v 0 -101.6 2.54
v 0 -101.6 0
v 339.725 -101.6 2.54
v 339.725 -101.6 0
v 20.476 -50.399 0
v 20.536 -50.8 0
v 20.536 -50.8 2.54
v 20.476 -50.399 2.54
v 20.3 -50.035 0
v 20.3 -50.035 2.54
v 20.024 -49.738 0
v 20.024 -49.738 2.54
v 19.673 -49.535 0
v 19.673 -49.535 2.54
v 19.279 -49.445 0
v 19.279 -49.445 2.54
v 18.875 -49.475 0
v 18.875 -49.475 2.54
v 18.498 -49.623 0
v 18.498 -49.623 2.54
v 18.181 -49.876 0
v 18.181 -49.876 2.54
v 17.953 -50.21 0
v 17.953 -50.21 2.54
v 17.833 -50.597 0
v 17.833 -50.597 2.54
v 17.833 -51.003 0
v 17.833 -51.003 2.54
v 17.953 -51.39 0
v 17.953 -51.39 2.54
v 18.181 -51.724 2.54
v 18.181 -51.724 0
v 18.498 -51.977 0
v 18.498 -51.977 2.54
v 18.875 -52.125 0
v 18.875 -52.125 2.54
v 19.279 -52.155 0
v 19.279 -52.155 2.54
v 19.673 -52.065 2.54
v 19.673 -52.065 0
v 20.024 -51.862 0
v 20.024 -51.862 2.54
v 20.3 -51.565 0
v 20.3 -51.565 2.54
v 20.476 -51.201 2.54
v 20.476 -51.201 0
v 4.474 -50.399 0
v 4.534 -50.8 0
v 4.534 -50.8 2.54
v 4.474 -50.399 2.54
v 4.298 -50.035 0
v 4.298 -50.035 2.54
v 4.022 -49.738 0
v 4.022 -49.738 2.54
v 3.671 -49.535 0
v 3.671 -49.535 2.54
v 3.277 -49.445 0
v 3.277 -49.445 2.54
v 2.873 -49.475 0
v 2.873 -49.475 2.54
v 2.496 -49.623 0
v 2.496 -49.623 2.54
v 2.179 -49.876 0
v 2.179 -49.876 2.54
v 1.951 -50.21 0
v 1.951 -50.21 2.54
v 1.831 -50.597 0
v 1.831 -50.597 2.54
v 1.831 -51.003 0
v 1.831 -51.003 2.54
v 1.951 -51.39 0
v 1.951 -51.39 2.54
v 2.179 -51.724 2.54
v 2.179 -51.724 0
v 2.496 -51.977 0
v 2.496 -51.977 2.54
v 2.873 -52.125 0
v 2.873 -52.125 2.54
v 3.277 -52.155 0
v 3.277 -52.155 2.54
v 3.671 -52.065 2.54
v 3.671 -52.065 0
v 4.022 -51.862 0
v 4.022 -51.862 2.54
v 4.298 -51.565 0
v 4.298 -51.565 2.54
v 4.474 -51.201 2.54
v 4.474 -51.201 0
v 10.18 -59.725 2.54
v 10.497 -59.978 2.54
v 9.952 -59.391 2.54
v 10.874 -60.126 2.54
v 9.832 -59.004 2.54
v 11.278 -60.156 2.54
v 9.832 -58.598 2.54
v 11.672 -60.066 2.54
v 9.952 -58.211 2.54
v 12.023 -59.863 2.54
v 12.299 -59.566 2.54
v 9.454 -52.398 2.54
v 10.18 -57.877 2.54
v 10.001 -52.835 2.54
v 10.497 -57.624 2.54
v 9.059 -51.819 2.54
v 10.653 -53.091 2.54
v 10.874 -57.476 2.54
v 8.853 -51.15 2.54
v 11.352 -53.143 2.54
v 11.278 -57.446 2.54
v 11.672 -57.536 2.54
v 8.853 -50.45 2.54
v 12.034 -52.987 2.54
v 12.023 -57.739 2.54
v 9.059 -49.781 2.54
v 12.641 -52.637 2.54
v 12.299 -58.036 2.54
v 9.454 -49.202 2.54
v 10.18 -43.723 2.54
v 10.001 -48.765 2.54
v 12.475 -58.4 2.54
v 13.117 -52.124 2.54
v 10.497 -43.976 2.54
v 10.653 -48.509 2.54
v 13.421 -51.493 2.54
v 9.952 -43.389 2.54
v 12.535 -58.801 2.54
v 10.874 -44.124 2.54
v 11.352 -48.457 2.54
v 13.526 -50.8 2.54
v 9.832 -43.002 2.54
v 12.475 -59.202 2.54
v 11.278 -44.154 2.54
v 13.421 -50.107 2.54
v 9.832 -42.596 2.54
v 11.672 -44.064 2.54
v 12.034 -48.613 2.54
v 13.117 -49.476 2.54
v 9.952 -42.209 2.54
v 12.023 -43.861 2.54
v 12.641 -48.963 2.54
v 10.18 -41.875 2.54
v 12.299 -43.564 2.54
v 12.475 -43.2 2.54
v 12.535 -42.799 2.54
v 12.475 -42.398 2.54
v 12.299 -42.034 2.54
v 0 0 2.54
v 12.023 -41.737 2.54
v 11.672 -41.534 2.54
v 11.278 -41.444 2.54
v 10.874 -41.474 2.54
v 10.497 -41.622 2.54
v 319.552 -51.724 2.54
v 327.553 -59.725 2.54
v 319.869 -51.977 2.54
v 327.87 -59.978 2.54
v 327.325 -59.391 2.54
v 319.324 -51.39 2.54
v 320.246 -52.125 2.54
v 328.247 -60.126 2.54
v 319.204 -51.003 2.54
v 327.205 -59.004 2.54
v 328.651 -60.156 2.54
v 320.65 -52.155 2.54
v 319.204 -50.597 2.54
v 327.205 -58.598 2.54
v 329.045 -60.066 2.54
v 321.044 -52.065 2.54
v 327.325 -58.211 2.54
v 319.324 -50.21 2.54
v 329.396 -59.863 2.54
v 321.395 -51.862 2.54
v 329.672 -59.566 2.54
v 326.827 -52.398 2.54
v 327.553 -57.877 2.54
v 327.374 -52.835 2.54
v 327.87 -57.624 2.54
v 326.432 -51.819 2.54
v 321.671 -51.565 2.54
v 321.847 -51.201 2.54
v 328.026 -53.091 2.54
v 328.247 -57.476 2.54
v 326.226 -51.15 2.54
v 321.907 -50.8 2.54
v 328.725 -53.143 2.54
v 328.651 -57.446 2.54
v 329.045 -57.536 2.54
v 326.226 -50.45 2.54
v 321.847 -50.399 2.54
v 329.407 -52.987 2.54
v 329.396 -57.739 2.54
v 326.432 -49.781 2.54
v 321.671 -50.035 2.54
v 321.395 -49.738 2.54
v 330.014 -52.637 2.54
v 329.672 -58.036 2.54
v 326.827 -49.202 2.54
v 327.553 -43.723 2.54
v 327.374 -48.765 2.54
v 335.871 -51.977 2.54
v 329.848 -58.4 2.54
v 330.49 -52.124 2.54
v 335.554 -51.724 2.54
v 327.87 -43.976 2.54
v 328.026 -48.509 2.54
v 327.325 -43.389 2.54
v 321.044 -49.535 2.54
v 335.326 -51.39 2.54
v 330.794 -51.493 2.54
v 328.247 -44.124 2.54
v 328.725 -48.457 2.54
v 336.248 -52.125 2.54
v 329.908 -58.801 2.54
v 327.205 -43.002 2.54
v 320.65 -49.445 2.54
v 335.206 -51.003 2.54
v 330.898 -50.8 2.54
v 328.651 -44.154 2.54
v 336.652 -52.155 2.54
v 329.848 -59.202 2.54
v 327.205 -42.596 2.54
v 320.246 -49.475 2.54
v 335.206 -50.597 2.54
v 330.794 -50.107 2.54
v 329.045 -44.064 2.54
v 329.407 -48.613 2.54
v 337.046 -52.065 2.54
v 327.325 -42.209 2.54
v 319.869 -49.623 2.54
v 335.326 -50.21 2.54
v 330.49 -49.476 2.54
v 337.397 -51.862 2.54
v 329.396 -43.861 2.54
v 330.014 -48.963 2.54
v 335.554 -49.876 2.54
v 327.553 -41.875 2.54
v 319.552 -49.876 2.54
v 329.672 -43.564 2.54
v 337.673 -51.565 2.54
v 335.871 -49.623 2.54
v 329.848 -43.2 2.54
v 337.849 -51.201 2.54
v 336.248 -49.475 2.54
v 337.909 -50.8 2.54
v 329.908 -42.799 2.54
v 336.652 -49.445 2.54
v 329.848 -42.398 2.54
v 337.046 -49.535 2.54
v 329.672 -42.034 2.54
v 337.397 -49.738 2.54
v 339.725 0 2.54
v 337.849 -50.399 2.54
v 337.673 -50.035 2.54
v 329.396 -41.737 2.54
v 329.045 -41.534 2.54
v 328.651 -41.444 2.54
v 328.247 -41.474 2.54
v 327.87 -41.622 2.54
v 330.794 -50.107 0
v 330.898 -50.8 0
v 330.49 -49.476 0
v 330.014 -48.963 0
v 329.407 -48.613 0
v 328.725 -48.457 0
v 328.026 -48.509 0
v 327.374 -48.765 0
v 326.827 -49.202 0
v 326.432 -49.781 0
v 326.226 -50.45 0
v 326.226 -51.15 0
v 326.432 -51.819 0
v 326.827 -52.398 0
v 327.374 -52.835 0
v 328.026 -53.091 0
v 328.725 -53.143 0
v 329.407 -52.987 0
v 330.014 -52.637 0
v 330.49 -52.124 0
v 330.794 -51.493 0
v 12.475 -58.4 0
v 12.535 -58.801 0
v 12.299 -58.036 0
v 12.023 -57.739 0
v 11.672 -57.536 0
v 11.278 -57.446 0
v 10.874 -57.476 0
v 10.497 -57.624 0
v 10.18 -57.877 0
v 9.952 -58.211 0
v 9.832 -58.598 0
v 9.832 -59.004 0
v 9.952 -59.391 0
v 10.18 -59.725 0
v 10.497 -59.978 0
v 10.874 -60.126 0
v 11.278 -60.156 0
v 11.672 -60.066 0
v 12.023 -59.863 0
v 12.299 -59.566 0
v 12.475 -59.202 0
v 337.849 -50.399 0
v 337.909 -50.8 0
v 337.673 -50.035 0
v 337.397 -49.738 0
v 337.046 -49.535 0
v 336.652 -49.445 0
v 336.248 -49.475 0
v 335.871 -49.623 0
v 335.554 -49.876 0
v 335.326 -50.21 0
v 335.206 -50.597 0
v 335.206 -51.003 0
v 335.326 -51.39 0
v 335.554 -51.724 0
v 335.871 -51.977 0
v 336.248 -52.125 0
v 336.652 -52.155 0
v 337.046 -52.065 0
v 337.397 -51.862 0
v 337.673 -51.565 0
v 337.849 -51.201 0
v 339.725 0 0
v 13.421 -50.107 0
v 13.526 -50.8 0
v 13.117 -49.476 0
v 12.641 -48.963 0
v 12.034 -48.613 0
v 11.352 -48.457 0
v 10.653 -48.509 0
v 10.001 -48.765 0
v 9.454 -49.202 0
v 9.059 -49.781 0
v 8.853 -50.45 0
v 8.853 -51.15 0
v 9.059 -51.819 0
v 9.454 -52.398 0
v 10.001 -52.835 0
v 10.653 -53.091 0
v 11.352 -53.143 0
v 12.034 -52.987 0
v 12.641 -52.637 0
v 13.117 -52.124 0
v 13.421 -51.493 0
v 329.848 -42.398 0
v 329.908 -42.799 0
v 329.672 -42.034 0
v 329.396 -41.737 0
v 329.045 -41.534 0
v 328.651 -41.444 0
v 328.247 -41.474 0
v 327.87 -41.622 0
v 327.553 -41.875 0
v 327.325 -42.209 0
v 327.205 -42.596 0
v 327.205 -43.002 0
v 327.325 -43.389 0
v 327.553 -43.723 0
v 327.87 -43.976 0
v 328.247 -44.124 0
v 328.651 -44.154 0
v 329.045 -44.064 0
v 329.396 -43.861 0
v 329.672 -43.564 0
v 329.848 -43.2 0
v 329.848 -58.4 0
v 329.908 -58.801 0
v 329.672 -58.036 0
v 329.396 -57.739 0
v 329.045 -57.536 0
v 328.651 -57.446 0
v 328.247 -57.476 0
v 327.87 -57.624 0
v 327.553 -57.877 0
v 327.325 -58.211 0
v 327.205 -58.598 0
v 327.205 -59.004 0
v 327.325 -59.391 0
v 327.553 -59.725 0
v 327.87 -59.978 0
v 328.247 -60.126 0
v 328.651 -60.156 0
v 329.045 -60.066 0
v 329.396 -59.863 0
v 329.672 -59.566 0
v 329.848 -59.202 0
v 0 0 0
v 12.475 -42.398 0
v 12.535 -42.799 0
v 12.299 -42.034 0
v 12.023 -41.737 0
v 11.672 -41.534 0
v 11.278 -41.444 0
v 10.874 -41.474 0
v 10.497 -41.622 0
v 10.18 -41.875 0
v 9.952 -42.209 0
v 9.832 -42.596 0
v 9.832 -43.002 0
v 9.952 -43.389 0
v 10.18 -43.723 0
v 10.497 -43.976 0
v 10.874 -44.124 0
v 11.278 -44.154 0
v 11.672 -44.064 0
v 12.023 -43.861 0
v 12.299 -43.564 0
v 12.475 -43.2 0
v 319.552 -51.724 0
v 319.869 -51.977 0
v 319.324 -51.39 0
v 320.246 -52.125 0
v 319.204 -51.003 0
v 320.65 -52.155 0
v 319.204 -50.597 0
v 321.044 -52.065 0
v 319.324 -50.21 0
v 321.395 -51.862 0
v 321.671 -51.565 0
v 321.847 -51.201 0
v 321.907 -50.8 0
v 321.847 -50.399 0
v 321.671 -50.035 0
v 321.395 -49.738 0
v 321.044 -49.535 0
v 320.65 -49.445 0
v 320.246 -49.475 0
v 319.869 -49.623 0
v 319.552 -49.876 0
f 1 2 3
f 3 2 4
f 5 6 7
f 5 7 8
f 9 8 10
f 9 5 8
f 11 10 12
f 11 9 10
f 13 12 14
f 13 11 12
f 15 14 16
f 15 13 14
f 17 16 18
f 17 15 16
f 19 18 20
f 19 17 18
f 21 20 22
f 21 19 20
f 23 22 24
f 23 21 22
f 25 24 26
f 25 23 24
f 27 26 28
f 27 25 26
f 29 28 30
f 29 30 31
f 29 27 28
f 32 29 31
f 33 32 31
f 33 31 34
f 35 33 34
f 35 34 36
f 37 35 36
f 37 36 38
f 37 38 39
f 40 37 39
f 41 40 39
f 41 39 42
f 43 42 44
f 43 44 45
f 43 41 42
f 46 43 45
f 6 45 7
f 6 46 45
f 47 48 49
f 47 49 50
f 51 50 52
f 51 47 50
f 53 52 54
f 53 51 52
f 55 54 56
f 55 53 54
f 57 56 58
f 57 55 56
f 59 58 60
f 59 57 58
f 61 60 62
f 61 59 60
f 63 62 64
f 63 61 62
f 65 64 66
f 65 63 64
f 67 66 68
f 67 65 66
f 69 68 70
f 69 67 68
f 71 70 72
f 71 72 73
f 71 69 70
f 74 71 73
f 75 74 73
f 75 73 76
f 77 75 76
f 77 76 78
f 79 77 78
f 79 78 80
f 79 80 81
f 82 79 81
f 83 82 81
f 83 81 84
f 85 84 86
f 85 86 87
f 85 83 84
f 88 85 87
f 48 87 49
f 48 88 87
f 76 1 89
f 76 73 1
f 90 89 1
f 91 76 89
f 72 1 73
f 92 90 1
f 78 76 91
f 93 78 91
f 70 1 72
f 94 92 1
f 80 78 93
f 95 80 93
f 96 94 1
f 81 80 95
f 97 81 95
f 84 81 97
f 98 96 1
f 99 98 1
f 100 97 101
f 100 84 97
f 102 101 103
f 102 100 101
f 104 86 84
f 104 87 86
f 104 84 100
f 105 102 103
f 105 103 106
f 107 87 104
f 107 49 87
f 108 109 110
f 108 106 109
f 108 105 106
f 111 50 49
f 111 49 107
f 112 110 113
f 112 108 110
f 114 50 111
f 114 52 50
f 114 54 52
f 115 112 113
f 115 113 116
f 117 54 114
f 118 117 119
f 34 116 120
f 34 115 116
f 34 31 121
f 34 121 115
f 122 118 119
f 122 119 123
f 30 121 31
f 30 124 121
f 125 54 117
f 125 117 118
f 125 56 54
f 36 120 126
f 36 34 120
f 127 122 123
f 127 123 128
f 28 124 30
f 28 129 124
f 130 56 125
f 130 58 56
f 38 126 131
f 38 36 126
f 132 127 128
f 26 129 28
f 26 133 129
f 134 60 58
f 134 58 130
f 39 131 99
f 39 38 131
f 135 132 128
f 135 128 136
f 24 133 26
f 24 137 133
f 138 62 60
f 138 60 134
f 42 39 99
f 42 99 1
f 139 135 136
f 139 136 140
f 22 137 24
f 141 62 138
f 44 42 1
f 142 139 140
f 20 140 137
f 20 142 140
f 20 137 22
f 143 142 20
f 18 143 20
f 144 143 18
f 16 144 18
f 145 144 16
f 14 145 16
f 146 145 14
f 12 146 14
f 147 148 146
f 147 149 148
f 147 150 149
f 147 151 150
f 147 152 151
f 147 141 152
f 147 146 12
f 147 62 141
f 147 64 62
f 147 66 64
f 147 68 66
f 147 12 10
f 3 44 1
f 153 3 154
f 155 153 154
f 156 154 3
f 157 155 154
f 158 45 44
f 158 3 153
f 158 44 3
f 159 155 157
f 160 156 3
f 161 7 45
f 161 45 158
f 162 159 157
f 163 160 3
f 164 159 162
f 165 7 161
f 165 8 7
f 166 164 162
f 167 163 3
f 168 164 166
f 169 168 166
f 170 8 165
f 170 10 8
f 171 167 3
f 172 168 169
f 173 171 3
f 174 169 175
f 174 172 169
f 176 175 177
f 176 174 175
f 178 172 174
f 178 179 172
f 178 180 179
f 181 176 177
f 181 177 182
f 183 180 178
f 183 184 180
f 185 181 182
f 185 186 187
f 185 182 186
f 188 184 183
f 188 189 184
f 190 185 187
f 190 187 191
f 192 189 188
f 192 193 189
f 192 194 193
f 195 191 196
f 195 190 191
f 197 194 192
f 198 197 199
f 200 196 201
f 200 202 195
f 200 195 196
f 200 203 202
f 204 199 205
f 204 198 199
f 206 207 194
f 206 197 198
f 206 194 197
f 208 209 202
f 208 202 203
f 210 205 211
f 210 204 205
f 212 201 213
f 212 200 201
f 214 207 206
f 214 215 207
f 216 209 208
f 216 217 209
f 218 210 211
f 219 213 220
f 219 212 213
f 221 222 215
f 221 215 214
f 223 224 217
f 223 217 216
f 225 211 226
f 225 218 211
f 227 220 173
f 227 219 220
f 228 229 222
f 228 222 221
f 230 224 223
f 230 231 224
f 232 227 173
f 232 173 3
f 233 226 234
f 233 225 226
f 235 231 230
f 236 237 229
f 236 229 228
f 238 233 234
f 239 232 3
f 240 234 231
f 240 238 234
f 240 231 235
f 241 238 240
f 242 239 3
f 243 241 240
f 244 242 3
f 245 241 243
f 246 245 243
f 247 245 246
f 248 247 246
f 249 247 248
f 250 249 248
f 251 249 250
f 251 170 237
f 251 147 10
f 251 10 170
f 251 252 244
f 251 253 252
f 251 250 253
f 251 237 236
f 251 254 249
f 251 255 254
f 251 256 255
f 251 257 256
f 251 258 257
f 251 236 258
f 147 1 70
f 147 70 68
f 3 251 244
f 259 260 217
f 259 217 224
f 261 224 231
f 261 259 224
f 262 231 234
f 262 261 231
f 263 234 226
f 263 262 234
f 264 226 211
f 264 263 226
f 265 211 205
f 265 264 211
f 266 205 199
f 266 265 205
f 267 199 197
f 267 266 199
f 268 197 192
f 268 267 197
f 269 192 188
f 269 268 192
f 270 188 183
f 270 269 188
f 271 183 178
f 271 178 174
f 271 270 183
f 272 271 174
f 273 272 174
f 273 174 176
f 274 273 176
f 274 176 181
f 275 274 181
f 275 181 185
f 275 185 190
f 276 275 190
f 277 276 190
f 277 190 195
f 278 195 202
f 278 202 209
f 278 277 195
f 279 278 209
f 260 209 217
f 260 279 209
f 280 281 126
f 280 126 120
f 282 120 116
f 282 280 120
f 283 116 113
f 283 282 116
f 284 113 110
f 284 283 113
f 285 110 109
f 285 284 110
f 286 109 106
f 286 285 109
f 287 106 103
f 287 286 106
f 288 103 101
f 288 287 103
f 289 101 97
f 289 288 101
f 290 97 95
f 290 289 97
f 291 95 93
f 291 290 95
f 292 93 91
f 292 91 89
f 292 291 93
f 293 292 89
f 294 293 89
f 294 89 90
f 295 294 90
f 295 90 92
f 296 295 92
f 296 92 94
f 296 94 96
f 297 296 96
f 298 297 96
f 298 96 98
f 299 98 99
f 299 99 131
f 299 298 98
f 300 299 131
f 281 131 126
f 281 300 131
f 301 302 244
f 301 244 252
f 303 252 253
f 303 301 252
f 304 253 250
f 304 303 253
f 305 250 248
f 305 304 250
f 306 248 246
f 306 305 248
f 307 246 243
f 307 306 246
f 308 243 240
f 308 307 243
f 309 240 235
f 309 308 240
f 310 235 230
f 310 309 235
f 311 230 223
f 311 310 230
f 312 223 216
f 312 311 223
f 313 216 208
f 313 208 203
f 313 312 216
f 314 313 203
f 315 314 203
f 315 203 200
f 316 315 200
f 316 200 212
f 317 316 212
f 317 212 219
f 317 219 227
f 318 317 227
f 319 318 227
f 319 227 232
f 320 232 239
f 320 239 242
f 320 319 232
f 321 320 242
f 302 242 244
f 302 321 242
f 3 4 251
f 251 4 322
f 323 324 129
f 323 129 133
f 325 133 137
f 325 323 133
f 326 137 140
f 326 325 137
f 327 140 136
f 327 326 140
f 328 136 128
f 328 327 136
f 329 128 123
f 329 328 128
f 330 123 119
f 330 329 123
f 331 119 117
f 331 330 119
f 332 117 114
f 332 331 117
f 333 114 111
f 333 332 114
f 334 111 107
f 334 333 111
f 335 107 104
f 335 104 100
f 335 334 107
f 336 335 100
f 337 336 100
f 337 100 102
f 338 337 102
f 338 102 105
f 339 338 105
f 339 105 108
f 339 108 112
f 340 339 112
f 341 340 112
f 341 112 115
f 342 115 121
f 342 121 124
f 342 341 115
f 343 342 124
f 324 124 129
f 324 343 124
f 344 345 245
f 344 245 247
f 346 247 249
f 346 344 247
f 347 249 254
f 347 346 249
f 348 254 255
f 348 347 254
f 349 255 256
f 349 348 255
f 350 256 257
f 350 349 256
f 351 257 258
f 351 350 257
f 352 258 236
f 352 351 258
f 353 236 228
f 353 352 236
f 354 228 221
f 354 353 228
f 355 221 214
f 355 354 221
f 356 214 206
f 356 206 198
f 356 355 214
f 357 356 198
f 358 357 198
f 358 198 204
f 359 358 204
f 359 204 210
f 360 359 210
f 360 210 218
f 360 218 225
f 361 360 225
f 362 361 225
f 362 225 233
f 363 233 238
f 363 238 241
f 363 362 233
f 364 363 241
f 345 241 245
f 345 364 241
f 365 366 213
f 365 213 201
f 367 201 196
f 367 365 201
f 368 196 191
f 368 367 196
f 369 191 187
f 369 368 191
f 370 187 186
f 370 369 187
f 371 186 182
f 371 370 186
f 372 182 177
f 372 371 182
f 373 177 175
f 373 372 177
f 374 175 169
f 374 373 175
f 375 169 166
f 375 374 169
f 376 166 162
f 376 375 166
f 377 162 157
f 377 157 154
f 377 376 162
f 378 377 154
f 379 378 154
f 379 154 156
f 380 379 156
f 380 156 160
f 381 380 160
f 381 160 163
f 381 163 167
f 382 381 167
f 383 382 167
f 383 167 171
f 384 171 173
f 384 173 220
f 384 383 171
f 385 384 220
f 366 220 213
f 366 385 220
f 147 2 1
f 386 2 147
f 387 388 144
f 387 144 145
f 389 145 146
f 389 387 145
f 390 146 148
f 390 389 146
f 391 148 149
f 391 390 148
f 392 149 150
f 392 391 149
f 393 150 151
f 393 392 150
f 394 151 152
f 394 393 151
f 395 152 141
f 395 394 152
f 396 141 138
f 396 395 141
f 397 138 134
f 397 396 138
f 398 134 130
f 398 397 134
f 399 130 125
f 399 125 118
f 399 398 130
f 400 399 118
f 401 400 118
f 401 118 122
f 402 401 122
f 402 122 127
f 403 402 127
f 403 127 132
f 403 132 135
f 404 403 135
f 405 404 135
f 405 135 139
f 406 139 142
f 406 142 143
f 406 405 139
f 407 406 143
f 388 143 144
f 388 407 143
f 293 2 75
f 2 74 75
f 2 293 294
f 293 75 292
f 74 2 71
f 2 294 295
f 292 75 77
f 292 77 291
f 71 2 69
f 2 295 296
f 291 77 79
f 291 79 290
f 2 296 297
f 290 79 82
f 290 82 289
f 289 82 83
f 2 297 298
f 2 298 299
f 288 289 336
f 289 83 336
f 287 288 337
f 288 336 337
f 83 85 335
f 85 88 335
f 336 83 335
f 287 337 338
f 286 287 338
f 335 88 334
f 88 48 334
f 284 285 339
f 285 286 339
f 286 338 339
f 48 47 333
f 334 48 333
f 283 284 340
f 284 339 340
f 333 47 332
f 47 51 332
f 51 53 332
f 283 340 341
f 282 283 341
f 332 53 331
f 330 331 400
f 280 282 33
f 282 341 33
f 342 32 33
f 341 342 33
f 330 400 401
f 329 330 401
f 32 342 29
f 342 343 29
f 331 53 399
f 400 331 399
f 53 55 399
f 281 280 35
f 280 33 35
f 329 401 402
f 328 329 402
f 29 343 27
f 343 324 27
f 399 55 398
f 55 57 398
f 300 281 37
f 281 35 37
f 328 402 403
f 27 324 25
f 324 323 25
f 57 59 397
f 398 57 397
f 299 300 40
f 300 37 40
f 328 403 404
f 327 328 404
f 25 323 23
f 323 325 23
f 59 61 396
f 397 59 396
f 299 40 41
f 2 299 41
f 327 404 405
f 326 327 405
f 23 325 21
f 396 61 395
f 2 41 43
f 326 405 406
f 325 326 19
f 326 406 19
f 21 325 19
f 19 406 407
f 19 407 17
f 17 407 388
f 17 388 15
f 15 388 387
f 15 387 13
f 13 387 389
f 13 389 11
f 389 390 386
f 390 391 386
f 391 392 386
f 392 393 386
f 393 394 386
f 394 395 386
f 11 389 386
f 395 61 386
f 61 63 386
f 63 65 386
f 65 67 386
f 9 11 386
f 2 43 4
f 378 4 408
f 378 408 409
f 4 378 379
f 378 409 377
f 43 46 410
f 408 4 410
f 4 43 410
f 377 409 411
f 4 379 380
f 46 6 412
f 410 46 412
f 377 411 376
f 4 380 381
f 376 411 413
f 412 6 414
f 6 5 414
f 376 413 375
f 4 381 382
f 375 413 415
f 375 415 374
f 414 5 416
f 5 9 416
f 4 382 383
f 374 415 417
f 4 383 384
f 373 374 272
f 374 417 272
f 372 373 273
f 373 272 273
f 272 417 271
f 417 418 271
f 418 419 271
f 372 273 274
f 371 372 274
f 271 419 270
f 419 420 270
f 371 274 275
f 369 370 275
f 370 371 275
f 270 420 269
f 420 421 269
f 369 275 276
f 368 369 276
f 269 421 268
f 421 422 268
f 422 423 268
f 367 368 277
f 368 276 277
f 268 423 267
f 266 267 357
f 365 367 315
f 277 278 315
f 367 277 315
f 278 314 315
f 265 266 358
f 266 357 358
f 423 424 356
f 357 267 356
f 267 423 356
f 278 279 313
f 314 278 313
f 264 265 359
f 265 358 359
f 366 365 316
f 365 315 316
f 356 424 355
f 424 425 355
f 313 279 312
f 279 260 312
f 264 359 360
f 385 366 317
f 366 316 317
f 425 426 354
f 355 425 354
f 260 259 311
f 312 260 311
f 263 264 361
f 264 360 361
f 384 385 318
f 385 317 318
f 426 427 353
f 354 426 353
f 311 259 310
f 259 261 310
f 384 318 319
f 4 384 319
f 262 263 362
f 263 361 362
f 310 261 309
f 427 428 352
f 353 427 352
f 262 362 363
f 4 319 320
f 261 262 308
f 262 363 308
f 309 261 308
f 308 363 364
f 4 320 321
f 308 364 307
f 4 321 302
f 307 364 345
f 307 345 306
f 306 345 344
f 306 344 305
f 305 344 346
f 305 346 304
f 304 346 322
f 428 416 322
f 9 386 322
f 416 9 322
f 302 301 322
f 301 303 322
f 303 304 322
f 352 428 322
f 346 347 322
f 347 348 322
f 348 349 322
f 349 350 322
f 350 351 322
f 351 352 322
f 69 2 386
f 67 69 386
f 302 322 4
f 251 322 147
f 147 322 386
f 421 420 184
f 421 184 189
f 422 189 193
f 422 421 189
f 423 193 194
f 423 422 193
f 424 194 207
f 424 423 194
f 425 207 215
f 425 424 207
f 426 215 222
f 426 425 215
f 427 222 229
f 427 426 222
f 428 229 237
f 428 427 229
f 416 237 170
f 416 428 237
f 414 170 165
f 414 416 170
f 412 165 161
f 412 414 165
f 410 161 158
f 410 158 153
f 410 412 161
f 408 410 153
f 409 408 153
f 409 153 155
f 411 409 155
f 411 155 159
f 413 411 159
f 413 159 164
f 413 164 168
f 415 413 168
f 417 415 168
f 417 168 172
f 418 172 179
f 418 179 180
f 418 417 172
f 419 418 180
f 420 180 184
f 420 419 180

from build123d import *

# Parameters (mm, degrees)
F0_W     = 169.8625
F0_H     = 101.6
F0_R     = 1.3589
F0_R_2   = 2.3495
F1_DEPTH = 2.54


with BuildPart() as f1:
    # F0 (on Top) → F1 (new body)
    with BuildSketch(Plane.XY):
        with Locations((84.93125, -50.8)):
            Rectangle(F0_W, F0_H)
        with Locations((11.176, -58.801)):
            Circle(F0_R, mode=Mode.SUBTRACT)
        with Locations((3.175, -50.8)):
            Circle(F0_R, mode=Mode.SUBTRACT)
        with Locations((11.176, -50.8)):
            Circle(F0_R_2, mode=Mode.SUBTRACT)
        with Locations((19.177, -50.8)):
            Circle(F0_R, mode=Mode.SUBTRACT)
        with Locations((11.176, -42.799)):
            Circle(F0_R, mode=Mode.SUBTRACT)
        with Locations((254.79375, -50.8)):
            Rectangle(F0_W, F0_H)
        with Locations((328.549, -58.801)):
            Circle(F0_R, mode=Mode.SUBTRACT)
        with Locations((320.548, -50.8)):
            Circle(F0_R, mode=Mode.SUBTRACT)
        with Locations((328.549, -50.8)):
            Circle(F0_R_2, mode=Mode.SUBTRACT)
        with Locations((336.55, -50.8)):
            Circle(F0_R, mode=Mode.SUBTRACT)
        with Locations((328.549, -42.799)):
            Circle(F0_R, mode=Mode.SUBTRACT)
    extrude(amount=F1_DEPTH)


solid = f1.part
